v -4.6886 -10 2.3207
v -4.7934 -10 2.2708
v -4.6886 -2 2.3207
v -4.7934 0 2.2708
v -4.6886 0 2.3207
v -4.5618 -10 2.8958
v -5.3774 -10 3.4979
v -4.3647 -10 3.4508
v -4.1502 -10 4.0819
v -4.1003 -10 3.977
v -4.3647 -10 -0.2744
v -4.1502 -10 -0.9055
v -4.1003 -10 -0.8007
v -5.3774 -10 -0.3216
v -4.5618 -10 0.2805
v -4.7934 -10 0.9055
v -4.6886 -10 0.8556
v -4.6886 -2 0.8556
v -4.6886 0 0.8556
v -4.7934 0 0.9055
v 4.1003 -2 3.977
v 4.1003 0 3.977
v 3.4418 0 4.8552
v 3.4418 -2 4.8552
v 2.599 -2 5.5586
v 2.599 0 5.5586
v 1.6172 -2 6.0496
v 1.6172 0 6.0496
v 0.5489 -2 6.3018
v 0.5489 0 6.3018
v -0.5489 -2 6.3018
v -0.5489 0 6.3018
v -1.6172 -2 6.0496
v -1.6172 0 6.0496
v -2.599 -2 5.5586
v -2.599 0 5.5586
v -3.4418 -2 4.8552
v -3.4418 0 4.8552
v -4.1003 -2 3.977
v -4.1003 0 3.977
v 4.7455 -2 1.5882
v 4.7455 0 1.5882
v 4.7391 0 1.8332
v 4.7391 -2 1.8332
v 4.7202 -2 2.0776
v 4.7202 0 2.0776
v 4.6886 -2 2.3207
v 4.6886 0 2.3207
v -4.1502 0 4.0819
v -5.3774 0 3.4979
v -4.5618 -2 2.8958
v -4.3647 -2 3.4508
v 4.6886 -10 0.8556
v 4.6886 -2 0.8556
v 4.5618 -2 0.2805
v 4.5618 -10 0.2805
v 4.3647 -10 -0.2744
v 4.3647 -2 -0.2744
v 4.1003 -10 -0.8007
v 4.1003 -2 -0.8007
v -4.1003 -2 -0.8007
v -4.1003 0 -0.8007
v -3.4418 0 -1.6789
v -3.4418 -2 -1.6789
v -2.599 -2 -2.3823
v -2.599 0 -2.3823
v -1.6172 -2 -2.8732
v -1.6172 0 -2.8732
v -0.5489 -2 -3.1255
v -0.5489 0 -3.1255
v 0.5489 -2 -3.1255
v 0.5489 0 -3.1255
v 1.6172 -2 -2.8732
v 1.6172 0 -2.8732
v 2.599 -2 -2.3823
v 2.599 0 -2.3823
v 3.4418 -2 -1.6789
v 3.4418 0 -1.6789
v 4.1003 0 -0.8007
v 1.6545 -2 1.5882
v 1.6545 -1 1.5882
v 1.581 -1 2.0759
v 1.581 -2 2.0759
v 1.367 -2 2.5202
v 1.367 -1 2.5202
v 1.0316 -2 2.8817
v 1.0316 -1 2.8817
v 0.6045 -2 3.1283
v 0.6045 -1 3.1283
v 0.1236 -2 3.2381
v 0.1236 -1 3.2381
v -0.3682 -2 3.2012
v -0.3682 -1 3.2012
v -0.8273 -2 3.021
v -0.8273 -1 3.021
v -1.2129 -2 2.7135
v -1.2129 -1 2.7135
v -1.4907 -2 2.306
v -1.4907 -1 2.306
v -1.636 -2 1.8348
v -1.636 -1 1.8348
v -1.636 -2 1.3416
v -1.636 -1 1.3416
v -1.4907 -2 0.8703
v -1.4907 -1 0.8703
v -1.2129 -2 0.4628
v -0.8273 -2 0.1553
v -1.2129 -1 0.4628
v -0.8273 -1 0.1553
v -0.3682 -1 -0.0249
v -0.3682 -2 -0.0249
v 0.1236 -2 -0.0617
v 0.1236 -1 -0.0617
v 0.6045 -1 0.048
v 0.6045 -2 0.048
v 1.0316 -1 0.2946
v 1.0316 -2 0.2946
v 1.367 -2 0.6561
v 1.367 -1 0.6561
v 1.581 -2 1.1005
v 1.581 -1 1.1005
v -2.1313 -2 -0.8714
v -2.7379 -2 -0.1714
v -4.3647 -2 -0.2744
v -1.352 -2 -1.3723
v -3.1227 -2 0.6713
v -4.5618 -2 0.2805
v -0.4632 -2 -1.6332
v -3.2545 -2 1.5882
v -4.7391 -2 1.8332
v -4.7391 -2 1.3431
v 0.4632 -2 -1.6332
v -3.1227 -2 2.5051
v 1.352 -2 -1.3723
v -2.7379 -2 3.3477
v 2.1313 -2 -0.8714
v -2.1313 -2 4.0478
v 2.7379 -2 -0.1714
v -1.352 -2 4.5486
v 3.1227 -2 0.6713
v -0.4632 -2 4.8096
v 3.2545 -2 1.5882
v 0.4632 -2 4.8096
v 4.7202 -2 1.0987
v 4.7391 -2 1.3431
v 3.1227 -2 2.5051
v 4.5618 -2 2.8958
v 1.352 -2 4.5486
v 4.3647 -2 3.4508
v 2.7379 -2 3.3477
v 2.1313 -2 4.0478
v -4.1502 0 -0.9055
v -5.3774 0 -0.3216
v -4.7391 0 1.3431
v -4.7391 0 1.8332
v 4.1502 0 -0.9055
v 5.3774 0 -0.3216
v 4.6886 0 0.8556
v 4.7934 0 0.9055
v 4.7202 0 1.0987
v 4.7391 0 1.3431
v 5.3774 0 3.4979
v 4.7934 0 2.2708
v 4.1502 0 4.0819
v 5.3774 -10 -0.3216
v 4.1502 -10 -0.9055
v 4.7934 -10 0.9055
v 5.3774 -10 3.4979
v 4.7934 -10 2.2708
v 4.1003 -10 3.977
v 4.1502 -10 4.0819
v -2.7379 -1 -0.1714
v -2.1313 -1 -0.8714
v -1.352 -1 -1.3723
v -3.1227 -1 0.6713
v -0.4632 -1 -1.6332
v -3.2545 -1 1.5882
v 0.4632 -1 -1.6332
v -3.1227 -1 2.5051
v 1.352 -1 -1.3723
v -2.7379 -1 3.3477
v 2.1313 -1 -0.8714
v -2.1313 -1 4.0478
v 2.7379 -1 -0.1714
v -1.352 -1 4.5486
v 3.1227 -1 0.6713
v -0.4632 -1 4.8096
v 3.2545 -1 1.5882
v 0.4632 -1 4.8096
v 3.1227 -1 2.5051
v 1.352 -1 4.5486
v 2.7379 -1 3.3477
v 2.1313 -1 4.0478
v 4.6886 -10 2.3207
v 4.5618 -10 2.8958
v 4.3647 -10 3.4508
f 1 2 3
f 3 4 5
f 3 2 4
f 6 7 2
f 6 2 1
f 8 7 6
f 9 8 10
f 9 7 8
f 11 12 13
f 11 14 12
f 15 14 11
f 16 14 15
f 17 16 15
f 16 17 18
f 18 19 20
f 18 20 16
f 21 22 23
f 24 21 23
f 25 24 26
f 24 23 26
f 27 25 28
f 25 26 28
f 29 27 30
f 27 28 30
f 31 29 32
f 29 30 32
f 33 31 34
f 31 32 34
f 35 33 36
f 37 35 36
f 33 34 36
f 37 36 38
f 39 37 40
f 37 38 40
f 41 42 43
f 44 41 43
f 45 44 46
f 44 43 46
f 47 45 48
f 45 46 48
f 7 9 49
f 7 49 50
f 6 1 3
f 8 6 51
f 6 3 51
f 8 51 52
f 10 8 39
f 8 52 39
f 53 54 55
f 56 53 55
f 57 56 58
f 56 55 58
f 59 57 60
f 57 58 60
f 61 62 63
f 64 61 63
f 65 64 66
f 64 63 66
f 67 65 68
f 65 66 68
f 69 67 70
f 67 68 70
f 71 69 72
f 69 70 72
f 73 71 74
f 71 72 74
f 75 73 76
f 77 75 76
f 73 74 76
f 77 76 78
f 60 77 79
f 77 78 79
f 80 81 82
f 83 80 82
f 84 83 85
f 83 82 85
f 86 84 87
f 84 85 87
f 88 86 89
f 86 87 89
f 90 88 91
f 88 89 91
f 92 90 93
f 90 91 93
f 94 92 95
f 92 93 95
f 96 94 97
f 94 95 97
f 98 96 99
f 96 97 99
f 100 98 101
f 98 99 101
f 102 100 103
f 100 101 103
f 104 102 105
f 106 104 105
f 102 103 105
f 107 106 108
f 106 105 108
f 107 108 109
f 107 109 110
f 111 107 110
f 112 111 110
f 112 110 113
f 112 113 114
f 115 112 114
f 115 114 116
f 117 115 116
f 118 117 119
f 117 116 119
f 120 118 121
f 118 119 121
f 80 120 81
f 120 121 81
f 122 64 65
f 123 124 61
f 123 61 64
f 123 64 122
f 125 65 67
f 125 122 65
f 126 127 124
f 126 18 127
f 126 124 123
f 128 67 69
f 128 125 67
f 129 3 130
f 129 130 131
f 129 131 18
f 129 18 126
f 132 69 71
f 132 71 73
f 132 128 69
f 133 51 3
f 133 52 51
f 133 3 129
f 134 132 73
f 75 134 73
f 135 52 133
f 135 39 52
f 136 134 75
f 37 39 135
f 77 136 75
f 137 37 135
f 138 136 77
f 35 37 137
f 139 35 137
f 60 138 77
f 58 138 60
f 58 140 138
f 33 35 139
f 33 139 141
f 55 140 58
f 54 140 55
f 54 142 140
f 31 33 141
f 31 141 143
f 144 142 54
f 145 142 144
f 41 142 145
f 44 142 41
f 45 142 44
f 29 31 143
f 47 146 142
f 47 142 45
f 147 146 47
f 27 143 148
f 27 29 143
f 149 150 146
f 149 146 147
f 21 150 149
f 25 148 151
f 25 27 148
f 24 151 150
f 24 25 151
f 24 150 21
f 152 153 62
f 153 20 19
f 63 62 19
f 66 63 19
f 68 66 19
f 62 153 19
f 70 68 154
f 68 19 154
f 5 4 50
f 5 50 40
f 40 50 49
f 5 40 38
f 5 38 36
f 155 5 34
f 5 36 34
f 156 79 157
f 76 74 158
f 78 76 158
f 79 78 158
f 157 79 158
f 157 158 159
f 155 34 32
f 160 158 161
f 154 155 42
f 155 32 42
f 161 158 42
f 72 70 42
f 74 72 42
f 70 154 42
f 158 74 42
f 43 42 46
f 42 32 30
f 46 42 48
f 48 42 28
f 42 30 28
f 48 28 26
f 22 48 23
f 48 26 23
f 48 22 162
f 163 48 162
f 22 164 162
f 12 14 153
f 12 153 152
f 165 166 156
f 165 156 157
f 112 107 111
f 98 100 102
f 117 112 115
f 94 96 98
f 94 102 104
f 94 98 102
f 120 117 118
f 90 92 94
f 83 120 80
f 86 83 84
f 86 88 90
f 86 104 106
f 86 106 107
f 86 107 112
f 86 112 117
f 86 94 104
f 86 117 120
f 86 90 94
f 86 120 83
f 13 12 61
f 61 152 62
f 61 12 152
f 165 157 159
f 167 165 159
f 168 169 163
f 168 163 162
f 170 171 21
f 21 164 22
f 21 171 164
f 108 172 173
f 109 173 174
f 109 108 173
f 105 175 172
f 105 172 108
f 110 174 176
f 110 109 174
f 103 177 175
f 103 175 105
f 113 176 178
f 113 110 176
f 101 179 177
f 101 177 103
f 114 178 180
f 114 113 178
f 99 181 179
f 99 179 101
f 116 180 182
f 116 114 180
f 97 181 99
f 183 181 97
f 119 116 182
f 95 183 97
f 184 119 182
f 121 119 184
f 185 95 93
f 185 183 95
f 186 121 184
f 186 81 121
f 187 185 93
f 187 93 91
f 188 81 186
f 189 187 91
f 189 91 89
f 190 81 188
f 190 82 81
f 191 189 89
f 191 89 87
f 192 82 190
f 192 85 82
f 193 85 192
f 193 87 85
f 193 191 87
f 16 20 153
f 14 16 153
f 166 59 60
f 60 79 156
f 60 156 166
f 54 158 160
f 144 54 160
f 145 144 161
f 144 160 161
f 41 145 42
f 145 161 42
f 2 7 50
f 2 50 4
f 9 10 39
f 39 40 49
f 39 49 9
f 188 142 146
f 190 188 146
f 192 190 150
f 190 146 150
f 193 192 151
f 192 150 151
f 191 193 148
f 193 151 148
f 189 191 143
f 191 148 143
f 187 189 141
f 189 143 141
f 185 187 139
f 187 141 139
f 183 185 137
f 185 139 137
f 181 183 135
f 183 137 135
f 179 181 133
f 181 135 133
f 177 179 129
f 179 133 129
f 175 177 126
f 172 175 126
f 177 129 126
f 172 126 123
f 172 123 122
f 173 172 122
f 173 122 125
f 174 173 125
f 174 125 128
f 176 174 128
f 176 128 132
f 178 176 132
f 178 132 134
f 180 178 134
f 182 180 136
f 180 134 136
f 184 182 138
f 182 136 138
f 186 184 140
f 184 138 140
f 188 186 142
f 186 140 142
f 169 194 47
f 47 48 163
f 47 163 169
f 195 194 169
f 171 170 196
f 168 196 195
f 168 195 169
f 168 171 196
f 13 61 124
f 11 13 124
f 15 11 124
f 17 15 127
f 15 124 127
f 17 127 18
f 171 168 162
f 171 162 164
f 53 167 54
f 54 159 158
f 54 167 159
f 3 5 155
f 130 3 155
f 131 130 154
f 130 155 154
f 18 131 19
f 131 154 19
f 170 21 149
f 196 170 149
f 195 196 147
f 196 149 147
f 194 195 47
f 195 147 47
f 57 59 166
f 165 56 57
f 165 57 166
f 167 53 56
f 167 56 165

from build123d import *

# Parameters (mm, degrees)
F1_DEPTH = 2
F2_DEPTH = 10
F3_R     = 3.2545252872
F4_DEPTH = 1
F5_R     = 1.6545252872
F6_DEPTH = 1


with BuildPart() as f1:
    # F0 (on Front) → F1 (new body)
    with BuildSketch(Plane.XZ):
        with BuildLine():
            ThreePointArc((4.6885970941, 0.8556488446), (4.7312339405, 1.2208070974), (4.7454747128, 1.588170202))
            ThreePointArc((4.7454747128, 1.588170202), (4.7312339405, 1.9555333066), (4.6885970941, 2.3206915594))
            Line((4.6885970941, 2.3206915594), (3.5662952021, 2.8547403321))
            Line((3.5662952021, 2.8547403321), (4.1003439748, 3.9770422242))
            ThreePointArc((4.1003439748, 3.9770422242), (0, 6.3336449148), (-4.1003439748, 3.9770422242))
            Line((-4.1003439748, 3.9770422242), (-3.5662952021, 2.8547403321))
            Line((-3.5662952021, 2.8547403321), (-4.6885970941, 2.3206915594))
            ThreePointArc((-4.6885970941, 2.3206915594), (-4.7454747128, 1.588170202), (-4.6885970941, 0.8556488446))
            Line((-4.6885970941, 0.8556488446), (-3.5662952021, 0.3216000719))
            Line((-3.5662952021, 0.3216000719), (-4.1003439748, -0.8007018202))
            ThreePointArc((-4.1003439748, -0.8007018202), (0, -3.1573045108), (4.1003439748, -0.8007018202))
            Line((4.1003439748, -0.8007018202), (3.5662952021, 0.3216000719))
            Line((3.5662952021, 0.3216000719), (4.6885970941, 0.8556488446))
        make_face()
        with BuildLine():
            Line((-3.5662952021, 2.8547403321), (-4.1003439748, 3.9770422242))
            ThreePointArc((-4.1003439748, 3.9770422242), (-4.4718279998, 3.176340404), (-4.6885970941, 2.3206915594))
            Line((-4.6885970941, 2.3206915594), (-3.5662952021, 2.8547403321))
        make_face()
        with BuildLine():
            ThreePointArc((-4.6885970941, 2.3206915594), (-4.4718279998, 3.176340404), (-4.1003439748, 3.9770422242))
            Line((-4.1003439748, 3.9770422242), (-4.1502279279, 4.0818732017))
            Line((-4.1502279279, 4.0818732017), (-5.3773607975, 3.4979404759))
            Line((-5.3773607975, 3.4979404759), (-4.7934280717, 2.2708076063))
            Line((-4.7934280717, 2.2708076063), (-4.6885970941, 2.3206915594))
        make_face()
        with BuildLine():
            ThreePointArc((-4.6885970941, 0.8556488446), (-4.4718279998, 0), (-4.1003439748, -0.8007018202))
            Line((-4.1003439748, -0.8007018202), (-3.5662952021, 0.3216000719))
            Line((-3.5662952021, 0.3216000719), (-4.6885970941, 0.8556488446))
        make_face()
        with BuildLine():
            Line((-4.1502279279, -0.9055327977), (-4.1003439748, -0.8007018202))
            ThreePointArc((-4.1003439748, -0.8007018202), (-4.4718279998, 0), (-4.6885970941, 0.8556488446))
            Line((-4.6885970941, 0.8556488446), (-4.7934280717, 0.9055327977))
            Line((-4.7934280717, 0.9055327977), (-5.3773607975, -0.3216000719))
            Line((-5.3773607975, -0.3216000719), (-4.1502279279, -0.9055327977))
        make_face()
        with BuildLine():
            Line((4.7934280717, 0.9055327977), (4.6885970941, 0.8556488446))
            ThreePointArc((4.6885970941, 0.8556488446), (4.4718279998, 0), (4.1003439748, -0.8007018202))
            Line((4.1003439748, -0.8007018202), (4.1502279279, -0.9055327977))
            Line((4.1502279279, -0.9055327977), (5.3773607975, -0.3216000719))
            Line((5.3773607975, -0.3216000719), (4.7934280717, 0.9055327977))
        make_face()
        with BuildLine():
            ThreePointArc((4.1003439748, -0.8007018202), (4.4718279998, 0), (4.6885970941, 0.8556488446))
            Line((4.6885970941, 0.8556488446), (3.5662952021, 0.3216000719))
            Line((3.5662952021, 0.3216000719), (4.1003439748, -0.8007018202))
        make_face()
        with BuildLine():
            Line((3.5662952021, 2.8547403321), (4.6885970941, 2.3206915594))
            ThreePointArc((4.6885970941, 2.3206915594), (4.4718279998, 3.176340404), (4.1003439748, 3.9770422242))
            Line((4.1003439748, 3.9770422242), (3.5662952021, 2.8547403321))
        make_face()
        with BuildLine():
            ThreePointArc((4.1003439748, 3.9770422242), (4.4718279998, 3.176340404), (4.6885970941, 2.3206915594))
            Line((4.6885970941, 2.3206915594), (4.7934280717, 2.2708076063))
            Line((4.7934280717, 2.2708076063), (5.3773607975, 3.4979404759))
            Line((5.3773607975, 3.4979404759), (4.1502279279, 4.0818732017))
            Line((4.1502279279, 4.0818732017), (4.1003439748, 3.9770422242))
        make_face()
    extrude(amount=F1_DEPTH)

    # F0 (on Front) → F2 (join)
    with BuildSketch(Plane.XZ):
        with BuildLine():
            ThreePointArc((-4.6885970941, 2.3206915594), (-4.4718279998, 3.176340404), (-4.1003439748, 3.9770422242))
            Line((-4.1003439748, 3.9770422242), (-4.1502279279, 4.0818732017))
            Line((-4.1502279279, 4.0818732017), (-5.3773607975, 3.4979404759))
            Line((-5.3773607975, 3.4979404759), (-4.7934280717, 2.2708076063))
            Line((-4.7934280717, 2.2708076063), (-4.6885970941, 2.3206915594))
        make_face()
        with BuildLine():
            Line((-4.1502279279, -0.9055327977), (-4.1003439748, -0.8007018202))
            ThreePointArc((-4.1003439748, -0.8007018202), (-4.4718279998, 0), (-4.6885970941, 0.8556488446))
            Line((-4.6885970941, 0.8556488446), (-4.7934280717, 0.9055327977))
            Line((-4.7934280717, 0.9055327977), (-5.3773607975, -0.3216000719))
            Line((-5.3773607975, -0.3216000719), (-4.1502279279, -0.9055327977))
        make_face()
        with BuildLine():
            Line((4.7934280717, 0.9055327977), (4.6885970941, 0.8556488446))
            ThreePointArc((4.6885970941, 0.8556488446), (4.4718279998, 0), (4.1003439748, -0.8007018202))
            Line((4.1003439748, -0.8007018202), (4.1502279279, -0.9055327977))
            Line((4.1502279279, -0.9055327977), (5.3773607975, -0.3216000719))
            Line((5.3773607975, -0.3216000719), (4.7934280717, 0.9055327977))
        make_face()
        with BuildLine():
            ThreePointArc((4.1003439748, 3.9770422242), (4.4718279998, 3.176340404), (4.6885970941, 2.3206915594))
            Line((4.6885970941, 2.3206915594), (4.7934280717, 2.2708076063))
            Line((4.7934280717, 2.2708076063), (5.3773607975, 3.4979404759))
            Line((5.3773607975, 3.4979404759), (4.1502279279, 4.0818732017))
            Line((4.1502279279, 4.0818732017), (4.1003439748, 3.9770422242))
        make_face()
    extrude(amount=F2_DEPTH)

    # F3 (on face) → F4 (cut)
    with BuildSketch(Plane.XZ.offset(2)):
        with Locations((0, 1.588170202)):
            Circle(F3_R)
    extrude(amount=-F4_DEPTH, mode=Mode.SUBTRACT)

    # F5 (on face) → F6 (join)
    with BuildSketch(Plane.XZ.offset(1)):
        with Locations((0, 1.588170202)):
            Circle(F5_R)
    extrude(amount=F6_DEPTH)


solid = f1.part
